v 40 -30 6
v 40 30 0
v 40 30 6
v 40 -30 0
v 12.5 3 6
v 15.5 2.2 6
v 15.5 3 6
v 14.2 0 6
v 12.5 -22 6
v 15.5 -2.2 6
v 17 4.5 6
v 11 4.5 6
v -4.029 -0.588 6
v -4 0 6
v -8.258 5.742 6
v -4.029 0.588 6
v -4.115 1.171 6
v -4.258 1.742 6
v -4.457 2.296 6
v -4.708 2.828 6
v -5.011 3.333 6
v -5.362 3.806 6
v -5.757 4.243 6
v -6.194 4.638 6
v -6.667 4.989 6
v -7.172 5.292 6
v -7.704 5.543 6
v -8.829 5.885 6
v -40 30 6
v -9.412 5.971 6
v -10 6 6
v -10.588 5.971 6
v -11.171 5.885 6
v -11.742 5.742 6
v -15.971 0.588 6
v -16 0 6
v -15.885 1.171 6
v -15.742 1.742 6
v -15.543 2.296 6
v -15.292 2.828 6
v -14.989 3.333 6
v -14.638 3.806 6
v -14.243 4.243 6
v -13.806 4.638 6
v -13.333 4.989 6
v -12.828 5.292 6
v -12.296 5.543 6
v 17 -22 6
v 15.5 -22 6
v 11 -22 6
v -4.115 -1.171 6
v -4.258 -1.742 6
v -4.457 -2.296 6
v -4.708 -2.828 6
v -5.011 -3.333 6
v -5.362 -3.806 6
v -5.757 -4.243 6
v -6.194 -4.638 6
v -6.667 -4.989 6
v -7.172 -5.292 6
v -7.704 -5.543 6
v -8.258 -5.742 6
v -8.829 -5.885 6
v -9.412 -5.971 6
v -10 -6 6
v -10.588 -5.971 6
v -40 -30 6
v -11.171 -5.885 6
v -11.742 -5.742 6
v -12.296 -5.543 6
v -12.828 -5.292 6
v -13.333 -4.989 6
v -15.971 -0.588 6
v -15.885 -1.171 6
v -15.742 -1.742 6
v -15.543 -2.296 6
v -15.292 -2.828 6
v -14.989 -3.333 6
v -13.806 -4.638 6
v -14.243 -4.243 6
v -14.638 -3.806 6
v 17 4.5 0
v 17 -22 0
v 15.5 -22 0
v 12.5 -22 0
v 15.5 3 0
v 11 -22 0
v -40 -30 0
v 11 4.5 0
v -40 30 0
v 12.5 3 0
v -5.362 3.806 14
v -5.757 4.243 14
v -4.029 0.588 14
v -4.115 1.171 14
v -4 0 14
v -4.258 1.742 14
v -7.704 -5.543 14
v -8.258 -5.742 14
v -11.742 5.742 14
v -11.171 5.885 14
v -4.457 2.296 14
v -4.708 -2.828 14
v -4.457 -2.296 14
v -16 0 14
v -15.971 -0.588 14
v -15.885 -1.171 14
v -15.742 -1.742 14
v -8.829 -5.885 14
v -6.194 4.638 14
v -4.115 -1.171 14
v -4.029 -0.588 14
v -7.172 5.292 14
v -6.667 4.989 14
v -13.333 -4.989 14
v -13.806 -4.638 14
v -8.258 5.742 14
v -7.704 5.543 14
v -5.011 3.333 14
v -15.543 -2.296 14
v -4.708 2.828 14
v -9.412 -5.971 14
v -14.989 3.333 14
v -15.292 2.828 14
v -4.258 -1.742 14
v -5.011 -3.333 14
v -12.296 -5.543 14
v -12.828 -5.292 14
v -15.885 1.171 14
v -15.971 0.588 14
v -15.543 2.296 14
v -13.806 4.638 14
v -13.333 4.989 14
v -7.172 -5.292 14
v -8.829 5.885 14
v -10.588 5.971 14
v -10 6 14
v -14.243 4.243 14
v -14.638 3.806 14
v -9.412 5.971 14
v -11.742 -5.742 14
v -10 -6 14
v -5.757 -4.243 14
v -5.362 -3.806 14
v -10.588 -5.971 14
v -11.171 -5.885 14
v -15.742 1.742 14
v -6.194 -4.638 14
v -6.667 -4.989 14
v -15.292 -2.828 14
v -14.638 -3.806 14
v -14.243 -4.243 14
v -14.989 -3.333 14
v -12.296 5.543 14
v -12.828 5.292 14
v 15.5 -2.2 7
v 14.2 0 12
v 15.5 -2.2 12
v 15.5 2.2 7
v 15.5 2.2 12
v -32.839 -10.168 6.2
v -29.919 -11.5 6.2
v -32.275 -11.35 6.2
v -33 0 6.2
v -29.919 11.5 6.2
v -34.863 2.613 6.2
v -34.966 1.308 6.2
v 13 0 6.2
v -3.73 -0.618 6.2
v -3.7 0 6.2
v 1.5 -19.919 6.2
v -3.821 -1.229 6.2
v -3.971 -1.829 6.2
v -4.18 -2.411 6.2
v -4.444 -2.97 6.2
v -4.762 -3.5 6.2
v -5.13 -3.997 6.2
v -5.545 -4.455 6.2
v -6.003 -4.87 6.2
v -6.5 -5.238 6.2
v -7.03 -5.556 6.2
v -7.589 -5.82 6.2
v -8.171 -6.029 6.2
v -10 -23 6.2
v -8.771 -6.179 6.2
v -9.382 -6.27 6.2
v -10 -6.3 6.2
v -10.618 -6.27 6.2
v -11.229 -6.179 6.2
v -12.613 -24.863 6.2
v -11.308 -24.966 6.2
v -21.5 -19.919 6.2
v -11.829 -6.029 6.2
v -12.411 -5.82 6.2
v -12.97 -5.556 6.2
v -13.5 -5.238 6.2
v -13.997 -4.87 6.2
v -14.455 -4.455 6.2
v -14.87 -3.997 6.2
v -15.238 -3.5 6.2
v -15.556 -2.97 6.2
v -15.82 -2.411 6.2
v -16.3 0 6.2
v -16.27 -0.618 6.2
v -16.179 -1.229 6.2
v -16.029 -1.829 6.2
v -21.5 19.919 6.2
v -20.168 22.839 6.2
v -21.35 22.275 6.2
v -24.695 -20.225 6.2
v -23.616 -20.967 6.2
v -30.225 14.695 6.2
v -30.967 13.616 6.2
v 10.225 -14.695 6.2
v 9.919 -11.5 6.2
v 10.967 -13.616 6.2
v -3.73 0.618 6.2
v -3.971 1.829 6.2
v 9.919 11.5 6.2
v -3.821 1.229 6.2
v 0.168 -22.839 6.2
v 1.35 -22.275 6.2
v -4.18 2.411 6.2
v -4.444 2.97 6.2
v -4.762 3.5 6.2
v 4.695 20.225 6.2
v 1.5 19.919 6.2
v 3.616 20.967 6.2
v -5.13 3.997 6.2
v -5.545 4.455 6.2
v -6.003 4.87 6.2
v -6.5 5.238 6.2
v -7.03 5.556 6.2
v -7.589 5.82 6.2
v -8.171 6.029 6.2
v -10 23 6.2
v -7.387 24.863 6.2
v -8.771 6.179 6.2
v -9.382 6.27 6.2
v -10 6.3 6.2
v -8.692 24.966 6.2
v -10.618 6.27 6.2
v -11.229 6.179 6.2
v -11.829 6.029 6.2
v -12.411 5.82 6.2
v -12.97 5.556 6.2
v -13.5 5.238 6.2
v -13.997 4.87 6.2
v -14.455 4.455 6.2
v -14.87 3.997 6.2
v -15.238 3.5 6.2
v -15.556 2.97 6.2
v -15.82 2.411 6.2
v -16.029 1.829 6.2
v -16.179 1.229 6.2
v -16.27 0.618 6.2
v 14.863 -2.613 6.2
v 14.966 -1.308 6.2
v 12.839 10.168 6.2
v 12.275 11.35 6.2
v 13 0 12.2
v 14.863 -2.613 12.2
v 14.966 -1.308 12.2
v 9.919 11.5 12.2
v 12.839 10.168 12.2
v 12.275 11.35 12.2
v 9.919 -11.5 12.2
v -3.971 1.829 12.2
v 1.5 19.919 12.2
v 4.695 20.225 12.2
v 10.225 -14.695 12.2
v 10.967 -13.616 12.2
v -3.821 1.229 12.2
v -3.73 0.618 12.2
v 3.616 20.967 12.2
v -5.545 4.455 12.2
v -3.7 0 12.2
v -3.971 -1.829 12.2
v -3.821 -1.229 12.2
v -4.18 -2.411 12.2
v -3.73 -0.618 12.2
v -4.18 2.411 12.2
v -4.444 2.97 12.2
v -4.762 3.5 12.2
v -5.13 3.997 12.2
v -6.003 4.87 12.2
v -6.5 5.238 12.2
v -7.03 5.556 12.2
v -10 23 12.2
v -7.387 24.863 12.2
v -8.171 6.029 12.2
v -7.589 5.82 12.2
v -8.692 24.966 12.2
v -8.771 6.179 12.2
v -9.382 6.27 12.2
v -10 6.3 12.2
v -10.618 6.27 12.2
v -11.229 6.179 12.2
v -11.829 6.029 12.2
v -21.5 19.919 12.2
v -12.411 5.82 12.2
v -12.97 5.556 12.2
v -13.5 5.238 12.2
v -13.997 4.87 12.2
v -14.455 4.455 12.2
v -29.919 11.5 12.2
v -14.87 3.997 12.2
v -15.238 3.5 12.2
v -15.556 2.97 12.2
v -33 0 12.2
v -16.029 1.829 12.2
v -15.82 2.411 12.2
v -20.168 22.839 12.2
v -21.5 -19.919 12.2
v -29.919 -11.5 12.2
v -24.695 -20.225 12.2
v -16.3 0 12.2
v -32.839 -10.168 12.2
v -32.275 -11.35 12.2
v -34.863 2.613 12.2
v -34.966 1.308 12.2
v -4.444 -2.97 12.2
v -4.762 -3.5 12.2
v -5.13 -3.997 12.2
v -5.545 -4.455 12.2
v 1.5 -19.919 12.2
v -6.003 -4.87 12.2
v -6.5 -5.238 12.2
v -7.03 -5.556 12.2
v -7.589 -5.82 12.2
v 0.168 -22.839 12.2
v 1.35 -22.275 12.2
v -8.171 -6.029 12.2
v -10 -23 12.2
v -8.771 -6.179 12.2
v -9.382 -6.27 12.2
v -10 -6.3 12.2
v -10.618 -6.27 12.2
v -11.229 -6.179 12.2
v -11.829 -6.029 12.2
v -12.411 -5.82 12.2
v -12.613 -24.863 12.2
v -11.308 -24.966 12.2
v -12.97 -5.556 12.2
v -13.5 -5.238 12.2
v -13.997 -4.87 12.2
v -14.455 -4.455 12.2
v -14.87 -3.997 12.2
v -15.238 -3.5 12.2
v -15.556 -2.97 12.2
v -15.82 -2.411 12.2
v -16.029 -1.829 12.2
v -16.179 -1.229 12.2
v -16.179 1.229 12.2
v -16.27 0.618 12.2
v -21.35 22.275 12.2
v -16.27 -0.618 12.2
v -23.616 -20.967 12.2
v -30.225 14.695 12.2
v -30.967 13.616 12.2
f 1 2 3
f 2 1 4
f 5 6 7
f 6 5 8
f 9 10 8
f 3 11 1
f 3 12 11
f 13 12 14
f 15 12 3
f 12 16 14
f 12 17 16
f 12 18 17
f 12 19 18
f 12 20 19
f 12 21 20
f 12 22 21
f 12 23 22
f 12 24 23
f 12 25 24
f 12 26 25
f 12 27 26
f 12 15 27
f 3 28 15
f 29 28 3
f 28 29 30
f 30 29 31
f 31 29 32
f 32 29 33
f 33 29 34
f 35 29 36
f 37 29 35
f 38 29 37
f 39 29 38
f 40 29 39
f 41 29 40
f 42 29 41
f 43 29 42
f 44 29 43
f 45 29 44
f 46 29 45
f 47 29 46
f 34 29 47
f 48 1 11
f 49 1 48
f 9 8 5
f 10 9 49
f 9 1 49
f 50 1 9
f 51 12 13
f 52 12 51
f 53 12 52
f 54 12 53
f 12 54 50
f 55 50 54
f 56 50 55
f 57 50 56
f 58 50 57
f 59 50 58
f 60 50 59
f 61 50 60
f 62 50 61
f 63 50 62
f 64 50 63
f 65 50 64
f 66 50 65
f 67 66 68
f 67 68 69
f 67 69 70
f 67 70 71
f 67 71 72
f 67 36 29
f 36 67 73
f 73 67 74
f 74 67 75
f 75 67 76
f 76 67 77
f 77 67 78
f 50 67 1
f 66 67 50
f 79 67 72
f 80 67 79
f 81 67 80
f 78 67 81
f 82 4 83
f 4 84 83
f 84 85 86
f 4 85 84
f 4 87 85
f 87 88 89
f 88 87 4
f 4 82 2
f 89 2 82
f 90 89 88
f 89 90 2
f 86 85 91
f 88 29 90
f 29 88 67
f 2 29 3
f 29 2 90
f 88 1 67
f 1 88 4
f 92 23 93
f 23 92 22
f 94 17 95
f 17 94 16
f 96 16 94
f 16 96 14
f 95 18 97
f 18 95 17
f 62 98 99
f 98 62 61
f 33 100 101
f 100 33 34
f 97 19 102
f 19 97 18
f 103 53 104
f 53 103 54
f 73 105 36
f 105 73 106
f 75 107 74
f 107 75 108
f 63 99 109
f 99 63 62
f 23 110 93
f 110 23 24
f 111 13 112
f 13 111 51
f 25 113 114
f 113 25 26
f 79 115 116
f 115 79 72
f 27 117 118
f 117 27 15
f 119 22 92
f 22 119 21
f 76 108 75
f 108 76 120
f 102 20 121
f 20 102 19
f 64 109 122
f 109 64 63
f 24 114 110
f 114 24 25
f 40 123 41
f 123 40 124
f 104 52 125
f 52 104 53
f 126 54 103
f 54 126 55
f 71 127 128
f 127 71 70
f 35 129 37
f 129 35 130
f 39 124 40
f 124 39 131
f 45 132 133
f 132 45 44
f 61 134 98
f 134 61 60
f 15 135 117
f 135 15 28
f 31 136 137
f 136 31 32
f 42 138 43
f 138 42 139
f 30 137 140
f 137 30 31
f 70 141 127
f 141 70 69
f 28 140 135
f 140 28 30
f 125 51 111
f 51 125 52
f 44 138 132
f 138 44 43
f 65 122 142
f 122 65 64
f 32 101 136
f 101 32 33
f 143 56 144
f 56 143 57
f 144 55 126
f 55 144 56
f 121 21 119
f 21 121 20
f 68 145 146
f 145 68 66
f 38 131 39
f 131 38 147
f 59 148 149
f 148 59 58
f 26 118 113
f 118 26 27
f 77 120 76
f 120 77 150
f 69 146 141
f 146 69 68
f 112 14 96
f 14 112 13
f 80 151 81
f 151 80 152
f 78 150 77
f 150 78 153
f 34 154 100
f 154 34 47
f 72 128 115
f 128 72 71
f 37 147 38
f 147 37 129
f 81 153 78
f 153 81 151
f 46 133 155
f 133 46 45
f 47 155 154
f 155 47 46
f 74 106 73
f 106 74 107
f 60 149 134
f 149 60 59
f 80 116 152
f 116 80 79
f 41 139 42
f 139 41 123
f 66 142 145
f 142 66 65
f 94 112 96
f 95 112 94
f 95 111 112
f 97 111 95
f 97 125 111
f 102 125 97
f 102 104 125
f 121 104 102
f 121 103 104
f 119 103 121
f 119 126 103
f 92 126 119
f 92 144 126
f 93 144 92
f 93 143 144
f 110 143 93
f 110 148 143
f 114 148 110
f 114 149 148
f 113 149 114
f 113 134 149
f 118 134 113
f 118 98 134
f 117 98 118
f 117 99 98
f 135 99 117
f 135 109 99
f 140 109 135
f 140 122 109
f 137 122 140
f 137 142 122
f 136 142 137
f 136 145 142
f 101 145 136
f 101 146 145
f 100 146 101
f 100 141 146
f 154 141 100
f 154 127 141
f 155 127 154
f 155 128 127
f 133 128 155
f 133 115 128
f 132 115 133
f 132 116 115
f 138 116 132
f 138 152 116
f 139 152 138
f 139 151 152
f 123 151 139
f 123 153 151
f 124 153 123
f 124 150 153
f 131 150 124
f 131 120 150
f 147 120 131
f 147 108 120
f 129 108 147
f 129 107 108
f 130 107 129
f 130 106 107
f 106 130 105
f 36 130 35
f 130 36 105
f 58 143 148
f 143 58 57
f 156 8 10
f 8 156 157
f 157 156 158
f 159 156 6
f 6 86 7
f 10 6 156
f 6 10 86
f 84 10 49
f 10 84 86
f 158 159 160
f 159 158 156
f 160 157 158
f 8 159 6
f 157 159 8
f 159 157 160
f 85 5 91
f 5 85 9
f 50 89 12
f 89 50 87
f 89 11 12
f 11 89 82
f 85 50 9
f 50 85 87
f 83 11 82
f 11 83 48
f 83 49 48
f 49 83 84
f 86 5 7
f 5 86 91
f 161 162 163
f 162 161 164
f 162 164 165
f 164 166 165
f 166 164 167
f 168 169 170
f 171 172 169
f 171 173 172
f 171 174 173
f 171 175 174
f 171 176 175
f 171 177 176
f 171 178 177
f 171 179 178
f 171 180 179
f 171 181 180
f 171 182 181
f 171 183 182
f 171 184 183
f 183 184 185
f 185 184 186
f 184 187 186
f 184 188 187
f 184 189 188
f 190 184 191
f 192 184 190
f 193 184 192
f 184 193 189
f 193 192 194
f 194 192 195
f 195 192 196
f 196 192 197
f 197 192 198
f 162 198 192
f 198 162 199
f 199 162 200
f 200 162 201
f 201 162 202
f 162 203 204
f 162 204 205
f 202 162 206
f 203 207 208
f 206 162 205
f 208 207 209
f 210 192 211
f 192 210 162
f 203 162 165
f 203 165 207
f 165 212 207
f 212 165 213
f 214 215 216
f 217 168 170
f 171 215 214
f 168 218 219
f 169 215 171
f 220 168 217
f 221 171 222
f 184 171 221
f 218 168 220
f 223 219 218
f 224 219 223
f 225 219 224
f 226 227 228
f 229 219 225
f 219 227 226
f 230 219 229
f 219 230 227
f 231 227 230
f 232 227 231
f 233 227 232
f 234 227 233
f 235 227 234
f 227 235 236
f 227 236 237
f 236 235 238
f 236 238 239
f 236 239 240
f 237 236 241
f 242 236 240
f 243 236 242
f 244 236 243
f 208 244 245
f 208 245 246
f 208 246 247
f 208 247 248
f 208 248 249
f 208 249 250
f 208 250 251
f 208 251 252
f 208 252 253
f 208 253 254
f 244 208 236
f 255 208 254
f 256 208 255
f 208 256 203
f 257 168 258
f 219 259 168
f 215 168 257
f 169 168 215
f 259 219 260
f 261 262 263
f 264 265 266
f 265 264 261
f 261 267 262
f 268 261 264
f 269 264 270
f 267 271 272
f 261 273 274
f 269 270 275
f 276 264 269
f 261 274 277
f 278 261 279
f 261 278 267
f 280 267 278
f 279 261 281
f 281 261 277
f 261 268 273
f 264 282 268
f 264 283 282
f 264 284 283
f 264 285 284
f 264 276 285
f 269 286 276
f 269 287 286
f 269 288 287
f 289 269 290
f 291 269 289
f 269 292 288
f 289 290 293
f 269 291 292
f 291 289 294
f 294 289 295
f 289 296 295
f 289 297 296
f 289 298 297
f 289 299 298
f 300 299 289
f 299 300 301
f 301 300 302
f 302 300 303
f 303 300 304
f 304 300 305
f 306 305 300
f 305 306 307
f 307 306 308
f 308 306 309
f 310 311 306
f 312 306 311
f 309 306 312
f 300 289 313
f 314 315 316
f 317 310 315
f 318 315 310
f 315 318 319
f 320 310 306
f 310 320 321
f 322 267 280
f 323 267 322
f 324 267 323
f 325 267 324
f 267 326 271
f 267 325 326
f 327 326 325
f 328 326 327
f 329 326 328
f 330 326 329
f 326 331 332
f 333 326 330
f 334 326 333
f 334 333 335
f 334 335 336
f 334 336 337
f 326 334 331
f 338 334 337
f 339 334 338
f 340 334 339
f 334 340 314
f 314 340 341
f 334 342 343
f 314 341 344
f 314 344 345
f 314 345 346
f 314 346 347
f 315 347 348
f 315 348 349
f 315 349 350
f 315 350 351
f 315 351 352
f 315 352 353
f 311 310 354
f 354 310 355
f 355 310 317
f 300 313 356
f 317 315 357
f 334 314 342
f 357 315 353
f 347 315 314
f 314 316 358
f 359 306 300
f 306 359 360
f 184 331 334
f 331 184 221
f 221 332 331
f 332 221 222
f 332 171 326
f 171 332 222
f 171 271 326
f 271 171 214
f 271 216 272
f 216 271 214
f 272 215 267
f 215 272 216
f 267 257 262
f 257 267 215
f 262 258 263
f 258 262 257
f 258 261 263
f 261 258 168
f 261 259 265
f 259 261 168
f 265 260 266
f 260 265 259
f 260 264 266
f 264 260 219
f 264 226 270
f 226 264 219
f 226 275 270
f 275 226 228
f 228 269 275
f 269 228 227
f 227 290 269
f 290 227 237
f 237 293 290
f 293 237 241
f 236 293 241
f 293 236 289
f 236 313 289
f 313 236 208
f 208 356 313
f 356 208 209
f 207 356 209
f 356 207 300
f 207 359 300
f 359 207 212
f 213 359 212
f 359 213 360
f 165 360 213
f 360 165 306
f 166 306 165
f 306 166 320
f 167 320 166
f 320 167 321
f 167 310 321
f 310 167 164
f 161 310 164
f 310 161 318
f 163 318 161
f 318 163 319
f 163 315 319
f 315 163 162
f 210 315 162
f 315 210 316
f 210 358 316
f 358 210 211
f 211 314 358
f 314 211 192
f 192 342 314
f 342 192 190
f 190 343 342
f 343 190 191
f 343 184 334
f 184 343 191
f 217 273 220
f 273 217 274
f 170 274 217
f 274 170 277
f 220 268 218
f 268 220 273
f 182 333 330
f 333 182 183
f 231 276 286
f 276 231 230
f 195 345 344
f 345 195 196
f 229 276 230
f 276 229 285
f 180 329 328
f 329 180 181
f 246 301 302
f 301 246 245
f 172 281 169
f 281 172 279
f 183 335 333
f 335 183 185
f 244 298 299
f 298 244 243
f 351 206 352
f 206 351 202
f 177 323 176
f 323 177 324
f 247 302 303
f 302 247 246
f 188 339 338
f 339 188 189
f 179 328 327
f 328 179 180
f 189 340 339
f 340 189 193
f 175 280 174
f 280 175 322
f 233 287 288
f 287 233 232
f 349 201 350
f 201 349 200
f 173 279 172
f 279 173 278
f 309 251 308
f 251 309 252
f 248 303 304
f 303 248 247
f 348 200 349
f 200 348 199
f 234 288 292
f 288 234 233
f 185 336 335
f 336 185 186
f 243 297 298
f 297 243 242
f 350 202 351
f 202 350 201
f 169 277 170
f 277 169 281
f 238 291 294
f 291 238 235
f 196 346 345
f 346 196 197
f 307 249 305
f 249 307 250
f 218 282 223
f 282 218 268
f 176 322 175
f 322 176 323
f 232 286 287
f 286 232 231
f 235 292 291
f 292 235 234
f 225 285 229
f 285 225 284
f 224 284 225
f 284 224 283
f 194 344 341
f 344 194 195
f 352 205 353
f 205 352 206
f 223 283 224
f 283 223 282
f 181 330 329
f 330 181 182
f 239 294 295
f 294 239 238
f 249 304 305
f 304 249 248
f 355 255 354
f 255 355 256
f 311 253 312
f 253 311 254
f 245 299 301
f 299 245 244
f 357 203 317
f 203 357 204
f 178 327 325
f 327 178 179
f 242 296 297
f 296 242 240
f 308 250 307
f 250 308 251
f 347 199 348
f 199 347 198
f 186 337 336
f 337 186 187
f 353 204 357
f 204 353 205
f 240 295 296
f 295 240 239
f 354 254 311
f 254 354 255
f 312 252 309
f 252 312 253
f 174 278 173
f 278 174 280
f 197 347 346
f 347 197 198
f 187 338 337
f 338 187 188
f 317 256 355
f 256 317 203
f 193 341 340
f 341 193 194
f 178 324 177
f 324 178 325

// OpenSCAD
/* Ratchet wheel with spring pawl - desk demo, PLA, 0.4 mm nozzle, no supports.
   Wheel (~50 mm, 12 teeth) turns on a post; the pawl is part of the base on a
   flexible arm cut from the plate (U-slot). Free way is clockwise seen from
   above (negative rotation about +Z): the shallow tooth flanks cam the pawl
   out, the steep flanks block it in reverse. Zero overhangs: the pawl stands
   fully on the arm, all walls vertical. */
part = "assembly"; // [wheel:Wheel, base:Base, assembly:Assembly]

cadverify_only = "";
module instance(name, part, unit = 1) {
    echo(cadverify_instance = [name, part, unit]);
    if (cadverify_only == "" || cadverify_only == name) children();
}

// ---------- parameters (mm) ----------
Rtip = 25;          // wheel outer radius (50 mm across)
Rroot = 23;         // wheel root radius (tooth height 2 mm)
wheel_t = 6;        // wheel thickness
hole_D = 12.6;      // wheel centre hole diameter
post_D = 12;        // base post diameter (0.6 mm play on diameter)
post_h = 8;         // post height above base top
base_t = 6;         // base plate thickness
base_x = 80;
base_y = 60;
wheel_cx = -10;     // wheel centre in base/assembly XY
wheel_cy = 0;
wheel_gap = 0.2;    // wheel bottom above base top
wheel_lift_z = base_t + wheel_gap;   // 6.2 wheel bottom in assembly
post_top_z = base_t + post_h;        // 14
pawl_tip_x = 14.2;  // pawl tip: 0.8 inside tip circle, 1.2 off root
beam_x0 = 12.5; beam_x1 = 15.5;      // flexible arm: 3 mm wide ...
beam_y0 = -22; beam_y1 = 3;          // ... 25 mm long, fixed south, free north
slot_w = 1.5;       // slot width (clears a 0.4 mm nozzle)
pawl_h = 6;         // pawl height above plate (meets wheel band 6.2..12.2)
rest_angle = 0;     // gullet bottom centred on pawl tip

// tooth k: root at 30k, shallow rise to tip at 30k+24, tip land to +27,
// steep drop to root at +30.
function wheel_pts() = [
    for(k=[0:11]) for(j=[0:2])
        j==0 ? [Rroot*cos(k*30), Rroot*sin(k*30)]
      : j==1 ? [Rtip*cos(k*30+24), Rtip*sin(k*30+24)]
             : [Rtip*cos(k*30+27), Rtip*sin(k*30+27)]
];

module wheel() {
    difference() {
        linear_extrude(height=wheel_t, convexity=4)
            polygon(points=wheel_pts());
        translate([0,0,-1]) cylinder(d=hole_D, h=wheel_t+2, $fn=64);
    }
}

module base() {
    difference() {
        union() {
            // plate
            translate([-base_x/2, -base_y/2, 0]) cube([base_x, base_y, base_t]);
            // post the wheel turns on
            translate([wheel_cx, wheel_cy, base_t]) cylinder(d=post_D, h=post_h, $fn=64);
            // pawl wedge: tip near the wheel, root fused onto the free end of the
            // arm; the whole underside stands on the arm (no bridge)
            translate([0,0,base_t]) linear_extrude(height=pawl_h, convexity=2)
                polygon(points=[[pawl_tip_x, 0],[beam_x1, 2.2],[beam_x1, -2.2]]);
        }
        // U-slot freeing the arm: one connected through opening, all walls vertical
        translate([beam_x0-slot_w, beam_y0, -1]) cube([slot_w, 26.5, base_t+2]); // west x11..12.5 y-22..4.5
        translate([beam_x1, beam_y0, -1]) cube([slot_w, 26.5, base_t+2]);      // east x15.5..17 y-22..4.5
        translate([beam_x0-slot_w, beam_y1, -1]) cube([6, slot_w, base_t+2]);  // north x11..17 y3..4.5
    }
}

module assembly() {
    instance("base_inst", "base", 1) base();
    instance("wheel_inst", "wheel", 1)
        translate([wheel_cx, wheel_cy, wheel_lift_z]) rotate([0,0,rest_angle]) wheel();
}

// ---------- specs (computed from parameters) ----------
wheel_spec = [
    ["bounds", [[-Rtip, -Rtip, 0], [Rtip, Rtip, wheel_t]]],
    ["bodies", 1],
    ["through_holes", 1],
    ["support_faces", [["bed", "-z", 800]]],
    ["overhangs_allowed", []],
    ["copies", 1],
    ["details", [
        ["axle_hole", "hole", [0, 0, wheel_t+4], [0, 0, -1], [[0, hole_D], [3, hole_D]]],
        ["rim_thick", "thickness", [15, 0, wheel_t+4], [0, 0, -1], wheel_t],
        ["tooth0", "material", [[22.05, 7.71, 0], [23.05, 8.71, wheel_t]], 0.5],
        ["tooth4", "material", [[-18.89, 14.93, 0], [-17.89, 15.93, wheel_t]], 0.5],
        ["tooth8", "material", [[-4.67, -24.14, 0], [-3.67, -23.14, wheel_t]], 0.5]
    ]]
];

base_spec = [
    ["bounds", [[-base_x/2, -base_y/2, 0], [base_x/2, base_y/2, post_top_z]]],
    ["bodies", 1],
    ["through_holes", 1],
    ["support_faces", [["bed", "-z", 2000]]],
    ["overhangs_allowed", []],
    ["copies", 1],
    ["details", [
        ["plate_thick", "thickness", [0, -28, base_t+4], [0, 0, -1], base_t],
        ["post_dia", "thickness", [wheel_cx-10, wheel_cy, base_t+post_h-1], [1, 0, 0], post_D],
        ["post_core", "material", [[wheel_cx-2, -2, 8], [wheel_cx+2, 2, 13]], 0.8],
        ["arm_width", "thickness", [beam_x0-0.75, -16, 3], [1, 0, 0], beam_x1-beam_x0],
        ["arm_full", "material", [[13, -20, 0], [15, -12, base_t]], 0.8],
        ["slot_gap", "void", [[beam_x0-slot_w, -20, 0], [beam_x0, -10, base_t]], 0.8],
        ["slot_east", "void", [[beam_x1, -20, 0], [beam_x1+slot_w, -10, base_t]], 0.8],
        ["pawl_tip", "material", [[14.4, -0.3, 8], [15.2, 0.3, 11]], 0.5],
        ["pawl_stack", "thickness", [14.8, 0, base_t+pawl_h+3], [0, 0, -1], base_t+pawl_h]
    ]]
];

assembly_spec = [
    ["bounds", [[-base_x/2, -base_y/2, 0], [base_x/2, base_y/2, post_top_z]]],
    ["support_faces", [["desk", "-z", 2000]]],
    ["allowed_interferences", []],
    ["motions", [
        ["spin_free", ["wheel_inst"], "rotate", [wheel_cx, wheel_cy, wheel_lift_z], [0, 0, 1], [0, -360],
            ["flex", [["wheel_inst", "base_inst", 0.9, "pawl clicks over teeth"]]]]
    ]],
    ["assembly_order", [
        [["base_inst"], [0, 0, 0]],
        [["wheel_inst"], [0, 0, -1]]
    ]]
];

if (part == "wheel") {
    echo(cadverify_spec = wheel_spec);
    wheel();
} else if (part == "base") {
    echo(cadverify_spec = base_spec);
    base();
} else {
    echo(cadverify_spec = assembly_spec);
    assembly();
}
